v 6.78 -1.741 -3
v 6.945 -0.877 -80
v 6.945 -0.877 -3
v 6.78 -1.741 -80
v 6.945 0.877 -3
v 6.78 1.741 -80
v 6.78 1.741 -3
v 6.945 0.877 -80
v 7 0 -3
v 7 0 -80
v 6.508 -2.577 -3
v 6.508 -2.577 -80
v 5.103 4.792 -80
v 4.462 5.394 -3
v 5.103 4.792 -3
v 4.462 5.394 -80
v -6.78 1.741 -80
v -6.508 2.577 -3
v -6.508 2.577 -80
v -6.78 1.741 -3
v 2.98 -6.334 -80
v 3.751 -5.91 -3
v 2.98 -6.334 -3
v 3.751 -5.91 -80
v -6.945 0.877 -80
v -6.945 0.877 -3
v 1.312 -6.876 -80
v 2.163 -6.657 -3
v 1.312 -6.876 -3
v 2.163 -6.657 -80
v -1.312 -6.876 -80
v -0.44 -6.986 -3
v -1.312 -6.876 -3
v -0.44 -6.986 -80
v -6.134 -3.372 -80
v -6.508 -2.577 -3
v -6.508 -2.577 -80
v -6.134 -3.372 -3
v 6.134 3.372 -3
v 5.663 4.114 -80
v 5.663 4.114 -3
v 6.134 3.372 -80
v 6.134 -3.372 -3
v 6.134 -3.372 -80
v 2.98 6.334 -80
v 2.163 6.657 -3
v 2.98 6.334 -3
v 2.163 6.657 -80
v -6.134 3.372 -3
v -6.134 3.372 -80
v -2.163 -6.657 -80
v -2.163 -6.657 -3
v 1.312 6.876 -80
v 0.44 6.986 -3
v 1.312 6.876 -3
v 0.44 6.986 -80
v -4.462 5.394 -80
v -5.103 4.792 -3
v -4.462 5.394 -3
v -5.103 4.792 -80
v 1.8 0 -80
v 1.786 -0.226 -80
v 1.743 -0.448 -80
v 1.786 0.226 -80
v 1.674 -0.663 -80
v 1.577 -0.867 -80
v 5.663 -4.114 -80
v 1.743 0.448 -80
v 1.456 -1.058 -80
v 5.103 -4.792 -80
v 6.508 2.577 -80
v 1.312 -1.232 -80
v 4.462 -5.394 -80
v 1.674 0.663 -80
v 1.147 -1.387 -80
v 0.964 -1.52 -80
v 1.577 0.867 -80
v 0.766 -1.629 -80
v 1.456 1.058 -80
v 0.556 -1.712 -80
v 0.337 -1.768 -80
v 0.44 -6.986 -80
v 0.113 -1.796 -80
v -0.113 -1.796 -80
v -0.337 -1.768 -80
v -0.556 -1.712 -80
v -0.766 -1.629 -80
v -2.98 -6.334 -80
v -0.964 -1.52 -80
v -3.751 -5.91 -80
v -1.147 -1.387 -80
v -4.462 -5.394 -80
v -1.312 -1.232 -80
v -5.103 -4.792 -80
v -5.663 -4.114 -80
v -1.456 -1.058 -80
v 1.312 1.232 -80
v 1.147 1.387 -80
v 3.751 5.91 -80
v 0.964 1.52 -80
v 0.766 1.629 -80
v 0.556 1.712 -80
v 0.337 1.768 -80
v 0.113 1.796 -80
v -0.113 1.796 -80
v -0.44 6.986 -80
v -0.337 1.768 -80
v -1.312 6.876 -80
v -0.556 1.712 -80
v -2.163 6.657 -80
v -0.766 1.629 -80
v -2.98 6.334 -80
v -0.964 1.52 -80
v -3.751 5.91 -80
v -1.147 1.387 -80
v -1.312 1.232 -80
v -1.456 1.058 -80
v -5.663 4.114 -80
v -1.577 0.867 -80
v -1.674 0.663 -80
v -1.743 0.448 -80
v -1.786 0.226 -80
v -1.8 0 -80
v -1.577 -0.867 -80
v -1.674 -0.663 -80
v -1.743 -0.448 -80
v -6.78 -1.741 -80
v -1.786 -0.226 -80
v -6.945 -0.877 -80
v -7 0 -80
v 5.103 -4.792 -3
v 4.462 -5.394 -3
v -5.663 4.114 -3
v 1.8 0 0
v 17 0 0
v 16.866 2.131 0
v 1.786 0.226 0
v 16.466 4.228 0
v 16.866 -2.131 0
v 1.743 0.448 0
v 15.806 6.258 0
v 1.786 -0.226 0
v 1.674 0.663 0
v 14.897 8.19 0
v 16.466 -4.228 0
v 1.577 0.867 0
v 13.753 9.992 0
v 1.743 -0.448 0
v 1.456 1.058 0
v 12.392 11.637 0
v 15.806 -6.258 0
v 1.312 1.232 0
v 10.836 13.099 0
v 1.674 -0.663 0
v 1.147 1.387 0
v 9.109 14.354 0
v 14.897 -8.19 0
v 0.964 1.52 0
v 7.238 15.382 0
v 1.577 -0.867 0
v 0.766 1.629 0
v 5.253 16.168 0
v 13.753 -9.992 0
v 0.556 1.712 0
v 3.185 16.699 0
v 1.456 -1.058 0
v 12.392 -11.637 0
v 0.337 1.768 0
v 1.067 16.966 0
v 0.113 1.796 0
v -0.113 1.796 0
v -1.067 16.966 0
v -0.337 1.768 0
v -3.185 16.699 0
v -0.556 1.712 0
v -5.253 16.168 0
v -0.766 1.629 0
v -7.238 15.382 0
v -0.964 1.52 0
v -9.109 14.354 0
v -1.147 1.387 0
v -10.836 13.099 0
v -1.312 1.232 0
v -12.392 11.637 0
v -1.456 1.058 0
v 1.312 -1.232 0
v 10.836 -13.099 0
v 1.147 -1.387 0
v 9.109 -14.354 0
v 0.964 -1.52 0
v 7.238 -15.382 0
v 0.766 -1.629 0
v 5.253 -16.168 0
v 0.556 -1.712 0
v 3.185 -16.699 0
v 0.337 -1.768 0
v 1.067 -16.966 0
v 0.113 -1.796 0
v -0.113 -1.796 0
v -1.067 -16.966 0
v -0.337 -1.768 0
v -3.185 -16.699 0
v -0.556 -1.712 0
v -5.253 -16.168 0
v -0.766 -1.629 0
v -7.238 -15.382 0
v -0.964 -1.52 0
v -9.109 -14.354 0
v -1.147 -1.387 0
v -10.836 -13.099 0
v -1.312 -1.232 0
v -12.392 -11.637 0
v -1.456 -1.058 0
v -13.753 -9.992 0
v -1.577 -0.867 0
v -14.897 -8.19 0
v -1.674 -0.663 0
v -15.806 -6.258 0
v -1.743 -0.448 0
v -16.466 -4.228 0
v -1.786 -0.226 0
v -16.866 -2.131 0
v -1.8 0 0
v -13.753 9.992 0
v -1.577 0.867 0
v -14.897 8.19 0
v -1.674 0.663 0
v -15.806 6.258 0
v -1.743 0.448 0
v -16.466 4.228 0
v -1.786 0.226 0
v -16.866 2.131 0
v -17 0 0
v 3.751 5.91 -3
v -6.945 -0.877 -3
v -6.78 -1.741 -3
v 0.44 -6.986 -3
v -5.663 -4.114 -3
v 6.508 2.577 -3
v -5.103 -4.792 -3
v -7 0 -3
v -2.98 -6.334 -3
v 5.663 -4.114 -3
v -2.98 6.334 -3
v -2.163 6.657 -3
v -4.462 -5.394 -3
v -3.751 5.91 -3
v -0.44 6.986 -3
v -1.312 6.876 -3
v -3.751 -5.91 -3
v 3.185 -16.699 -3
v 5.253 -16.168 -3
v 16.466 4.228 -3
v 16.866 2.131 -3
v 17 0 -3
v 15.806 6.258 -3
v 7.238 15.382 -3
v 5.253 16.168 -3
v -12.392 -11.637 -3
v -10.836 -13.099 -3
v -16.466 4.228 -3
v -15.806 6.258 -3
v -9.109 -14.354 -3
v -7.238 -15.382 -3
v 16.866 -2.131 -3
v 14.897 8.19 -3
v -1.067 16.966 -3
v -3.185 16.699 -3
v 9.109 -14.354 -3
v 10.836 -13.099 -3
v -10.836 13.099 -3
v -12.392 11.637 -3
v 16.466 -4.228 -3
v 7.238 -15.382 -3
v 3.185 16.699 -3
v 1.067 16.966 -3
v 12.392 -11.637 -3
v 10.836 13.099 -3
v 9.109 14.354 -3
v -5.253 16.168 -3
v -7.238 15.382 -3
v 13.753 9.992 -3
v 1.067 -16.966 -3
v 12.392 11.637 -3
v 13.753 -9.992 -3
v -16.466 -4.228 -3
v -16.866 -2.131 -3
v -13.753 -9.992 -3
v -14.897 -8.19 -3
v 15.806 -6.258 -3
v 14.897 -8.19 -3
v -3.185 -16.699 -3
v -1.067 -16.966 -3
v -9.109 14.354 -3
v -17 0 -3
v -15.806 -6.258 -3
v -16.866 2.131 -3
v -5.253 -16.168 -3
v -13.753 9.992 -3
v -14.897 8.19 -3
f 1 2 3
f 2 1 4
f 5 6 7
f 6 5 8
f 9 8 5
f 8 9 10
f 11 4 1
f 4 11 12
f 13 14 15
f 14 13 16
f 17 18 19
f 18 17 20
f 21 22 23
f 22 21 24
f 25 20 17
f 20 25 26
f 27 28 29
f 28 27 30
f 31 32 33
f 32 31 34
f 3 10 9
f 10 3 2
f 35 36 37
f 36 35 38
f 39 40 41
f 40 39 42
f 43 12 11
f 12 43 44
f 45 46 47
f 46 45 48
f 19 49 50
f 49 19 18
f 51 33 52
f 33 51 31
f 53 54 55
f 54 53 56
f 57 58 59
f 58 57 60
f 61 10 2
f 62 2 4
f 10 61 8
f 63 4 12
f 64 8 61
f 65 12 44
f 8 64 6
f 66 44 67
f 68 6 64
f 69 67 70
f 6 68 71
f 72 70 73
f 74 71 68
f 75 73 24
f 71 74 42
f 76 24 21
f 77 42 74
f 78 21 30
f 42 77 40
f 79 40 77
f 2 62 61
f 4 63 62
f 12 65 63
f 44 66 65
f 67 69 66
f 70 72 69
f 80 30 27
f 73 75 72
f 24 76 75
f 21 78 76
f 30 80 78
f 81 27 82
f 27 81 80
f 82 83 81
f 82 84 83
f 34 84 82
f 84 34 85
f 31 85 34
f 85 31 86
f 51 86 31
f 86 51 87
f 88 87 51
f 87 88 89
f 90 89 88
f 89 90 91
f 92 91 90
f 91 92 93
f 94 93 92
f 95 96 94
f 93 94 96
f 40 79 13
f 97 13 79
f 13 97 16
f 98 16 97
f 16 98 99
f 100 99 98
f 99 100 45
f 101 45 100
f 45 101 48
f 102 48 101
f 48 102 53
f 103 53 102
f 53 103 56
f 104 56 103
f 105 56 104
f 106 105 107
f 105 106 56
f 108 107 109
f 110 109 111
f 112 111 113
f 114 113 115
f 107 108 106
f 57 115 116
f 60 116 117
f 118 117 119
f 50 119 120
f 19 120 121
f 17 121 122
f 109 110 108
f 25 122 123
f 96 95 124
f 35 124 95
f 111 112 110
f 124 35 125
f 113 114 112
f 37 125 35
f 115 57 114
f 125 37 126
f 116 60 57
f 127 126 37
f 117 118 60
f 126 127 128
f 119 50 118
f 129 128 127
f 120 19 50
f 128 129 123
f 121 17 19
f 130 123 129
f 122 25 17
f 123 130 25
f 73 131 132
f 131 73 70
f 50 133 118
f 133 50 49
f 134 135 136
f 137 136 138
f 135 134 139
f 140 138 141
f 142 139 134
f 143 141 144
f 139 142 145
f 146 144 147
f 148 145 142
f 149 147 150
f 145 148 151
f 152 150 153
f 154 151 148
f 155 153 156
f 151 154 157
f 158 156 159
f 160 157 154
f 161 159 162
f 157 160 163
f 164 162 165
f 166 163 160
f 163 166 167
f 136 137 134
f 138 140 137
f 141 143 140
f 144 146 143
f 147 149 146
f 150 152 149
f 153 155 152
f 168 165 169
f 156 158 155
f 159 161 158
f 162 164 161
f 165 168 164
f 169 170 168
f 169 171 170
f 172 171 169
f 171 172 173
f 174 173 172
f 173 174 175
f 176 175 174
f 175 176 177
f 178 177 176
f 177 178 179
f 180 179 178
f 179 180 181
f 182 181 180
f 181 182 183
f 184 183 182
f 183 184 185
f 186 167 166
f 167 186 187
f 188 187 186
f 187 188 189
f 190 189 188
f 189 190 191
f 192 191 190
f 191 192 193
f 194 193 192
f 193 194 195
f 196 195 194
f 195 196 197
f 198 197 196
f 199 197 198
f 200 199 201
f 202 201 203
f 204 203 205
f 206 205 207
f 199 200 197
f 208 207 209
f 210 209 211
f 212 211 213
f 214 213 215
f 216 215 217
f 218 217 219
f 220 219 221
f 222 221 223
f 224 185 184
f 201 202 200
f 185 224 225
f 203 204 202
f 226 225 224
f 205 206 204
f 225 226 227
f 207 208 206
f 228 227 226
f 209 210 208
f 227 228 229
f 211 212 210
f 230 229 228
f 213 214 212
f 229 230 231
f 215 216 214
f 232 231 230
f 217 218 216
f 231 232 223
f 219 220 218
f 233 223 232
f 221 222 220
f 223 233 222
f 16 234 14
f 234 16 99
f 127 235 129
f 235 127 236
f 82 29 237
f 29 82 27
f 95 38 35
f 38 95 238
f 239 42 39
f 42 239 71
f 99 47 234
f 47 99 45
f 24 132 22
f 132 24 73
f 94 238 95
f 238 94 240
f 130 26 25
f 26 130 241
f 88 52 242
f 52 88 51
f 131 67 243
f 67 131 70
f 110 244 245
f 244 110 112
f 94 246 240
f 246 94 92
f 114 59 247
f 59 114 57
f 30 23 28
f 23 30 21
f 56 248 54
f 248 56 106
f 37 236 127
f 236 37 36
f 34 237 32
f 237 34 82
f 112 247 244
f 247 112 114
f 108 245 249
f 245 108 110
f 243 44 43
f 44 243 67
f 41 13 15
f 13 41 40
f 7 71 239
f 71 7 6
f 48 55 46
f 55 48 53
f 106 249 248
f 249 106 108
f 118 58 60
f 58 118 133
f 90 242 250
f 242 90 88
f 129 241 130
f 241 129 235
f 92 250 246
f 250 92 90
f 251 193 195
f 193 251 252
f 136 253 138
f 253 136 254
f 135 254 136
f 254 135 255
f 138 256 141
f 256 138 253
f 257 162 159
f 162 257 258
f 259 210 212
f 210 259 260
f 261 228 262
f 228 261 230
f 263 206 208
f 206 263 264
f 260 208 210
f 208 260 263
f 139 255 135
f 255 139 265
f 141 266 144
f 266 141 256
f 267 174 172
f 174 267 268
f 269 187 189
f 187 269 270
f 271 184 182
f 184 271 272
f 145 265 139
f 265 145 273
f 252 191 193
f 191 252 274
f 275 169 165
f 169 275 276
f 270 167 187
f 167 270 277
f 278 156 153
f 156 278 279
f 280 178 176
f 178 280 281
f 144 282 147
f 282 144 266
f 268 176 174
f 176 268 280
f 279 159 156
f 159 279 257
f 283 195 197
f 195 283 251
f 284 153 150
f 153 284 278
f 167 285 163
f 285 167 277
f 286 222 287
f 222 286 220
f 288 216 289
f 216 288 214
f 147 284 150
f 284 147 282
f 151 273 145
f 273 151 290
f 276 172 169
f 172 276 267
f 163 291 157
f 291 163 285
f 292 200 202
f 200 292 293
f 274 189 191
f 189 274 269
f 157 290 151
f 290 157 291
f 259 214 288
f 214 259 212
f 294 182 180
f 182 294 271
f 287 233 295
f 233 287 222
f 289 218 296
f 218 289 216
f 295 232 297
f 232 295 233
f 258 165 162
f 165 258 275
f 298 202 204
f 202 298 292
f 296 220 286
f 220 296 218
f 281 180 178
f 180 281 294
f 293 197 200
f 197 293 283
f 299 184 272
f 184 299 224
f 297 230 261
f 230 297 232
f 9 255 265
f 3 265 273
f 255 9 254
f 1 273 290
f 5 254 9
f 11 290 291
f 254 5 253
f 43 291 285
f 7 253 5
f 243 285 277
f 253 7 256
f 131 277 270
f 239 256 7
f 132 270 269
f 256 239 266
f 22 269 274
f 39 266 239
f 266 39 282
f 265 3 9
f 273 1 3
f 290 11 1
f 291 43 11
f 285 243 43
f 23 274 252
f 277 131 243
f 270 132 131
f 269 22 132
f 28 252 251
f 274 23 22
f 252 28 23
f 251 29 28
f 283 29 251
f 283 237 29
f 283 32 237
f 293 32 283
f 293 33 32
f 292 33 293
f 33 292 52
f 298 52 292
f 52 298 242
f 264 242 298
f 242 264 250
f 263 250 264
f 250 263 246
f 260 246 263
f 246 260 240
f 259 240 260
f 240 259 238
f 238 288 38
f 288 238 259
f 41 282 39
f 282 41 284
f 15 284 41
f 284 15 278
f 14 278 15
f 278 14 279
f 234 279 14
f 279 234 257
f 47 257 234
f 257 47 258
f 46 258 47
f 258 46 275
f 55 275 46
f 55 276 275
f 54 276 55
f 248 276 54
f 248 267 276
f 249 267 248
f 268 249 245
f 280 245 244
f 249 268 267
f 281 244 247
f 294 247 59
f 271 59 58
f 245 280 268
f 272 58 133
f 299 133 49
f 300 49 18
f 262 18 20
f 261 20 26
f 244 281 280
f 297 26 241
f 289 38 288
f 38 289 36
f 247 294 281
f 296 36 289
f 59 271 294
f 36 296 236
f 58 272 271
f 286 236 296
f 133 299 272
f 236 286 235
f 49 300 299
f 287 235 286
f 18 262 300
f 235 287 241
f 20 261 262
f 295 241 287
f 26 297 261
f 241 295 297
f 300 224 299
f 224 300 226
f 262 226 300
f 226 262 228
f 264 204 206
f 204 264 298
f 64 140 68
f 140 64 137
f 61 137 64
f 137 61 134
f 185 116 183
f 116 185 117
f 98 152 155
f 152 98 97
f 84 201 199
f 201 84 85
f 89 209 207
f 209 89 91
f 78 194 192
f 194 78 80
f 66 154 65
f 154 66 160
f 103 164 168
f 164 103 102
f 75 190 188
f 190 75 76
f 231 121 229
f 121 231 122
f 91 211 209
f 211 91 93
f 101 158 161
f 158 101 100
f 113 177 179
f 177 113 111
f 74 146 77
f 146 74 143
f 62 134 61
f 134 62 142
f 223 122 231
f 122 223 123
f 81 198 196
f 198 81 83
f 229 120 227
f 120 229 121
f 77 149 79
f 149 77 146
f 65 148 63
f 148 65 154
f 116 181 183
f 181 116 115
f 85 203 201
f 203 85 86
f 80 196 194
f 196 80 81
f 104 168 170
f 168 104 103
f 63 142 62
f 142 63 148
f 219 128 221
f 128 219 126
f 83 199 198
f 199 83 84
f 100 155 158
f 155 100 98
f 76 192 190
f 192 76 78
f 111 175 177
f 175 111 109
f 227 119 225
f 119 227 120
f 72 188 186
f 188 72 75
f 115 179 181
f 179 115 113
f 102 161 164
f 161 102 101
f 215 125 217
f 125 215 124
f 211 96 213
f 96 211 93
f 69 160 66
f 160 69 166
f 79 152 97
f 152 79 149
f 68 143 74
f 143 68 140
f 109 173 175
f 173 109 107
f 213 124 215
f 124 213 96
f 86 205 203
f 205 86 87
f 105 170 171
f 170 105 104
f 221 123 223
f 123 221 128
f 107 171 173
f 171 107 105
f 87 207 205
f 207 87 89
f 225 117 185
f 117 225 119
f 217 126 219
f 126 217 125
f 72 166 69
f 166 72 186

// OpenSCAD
$fn = 50;


difference() {
	union() {
		translate(v = [0, 0, -80.0000000000]) {
			cylinder(h = 80, r = 7.0000000000);
		}
		translate(v = [0, 0, -3.0000000000]) {
			cylinder(h = 3, r = 17.0000000000);
		}
	}
	union() {
		#translate(v = [0, 0, -80]) {
			cylinder(h = 80, r = 1.8000000000);
		}
	}
}
